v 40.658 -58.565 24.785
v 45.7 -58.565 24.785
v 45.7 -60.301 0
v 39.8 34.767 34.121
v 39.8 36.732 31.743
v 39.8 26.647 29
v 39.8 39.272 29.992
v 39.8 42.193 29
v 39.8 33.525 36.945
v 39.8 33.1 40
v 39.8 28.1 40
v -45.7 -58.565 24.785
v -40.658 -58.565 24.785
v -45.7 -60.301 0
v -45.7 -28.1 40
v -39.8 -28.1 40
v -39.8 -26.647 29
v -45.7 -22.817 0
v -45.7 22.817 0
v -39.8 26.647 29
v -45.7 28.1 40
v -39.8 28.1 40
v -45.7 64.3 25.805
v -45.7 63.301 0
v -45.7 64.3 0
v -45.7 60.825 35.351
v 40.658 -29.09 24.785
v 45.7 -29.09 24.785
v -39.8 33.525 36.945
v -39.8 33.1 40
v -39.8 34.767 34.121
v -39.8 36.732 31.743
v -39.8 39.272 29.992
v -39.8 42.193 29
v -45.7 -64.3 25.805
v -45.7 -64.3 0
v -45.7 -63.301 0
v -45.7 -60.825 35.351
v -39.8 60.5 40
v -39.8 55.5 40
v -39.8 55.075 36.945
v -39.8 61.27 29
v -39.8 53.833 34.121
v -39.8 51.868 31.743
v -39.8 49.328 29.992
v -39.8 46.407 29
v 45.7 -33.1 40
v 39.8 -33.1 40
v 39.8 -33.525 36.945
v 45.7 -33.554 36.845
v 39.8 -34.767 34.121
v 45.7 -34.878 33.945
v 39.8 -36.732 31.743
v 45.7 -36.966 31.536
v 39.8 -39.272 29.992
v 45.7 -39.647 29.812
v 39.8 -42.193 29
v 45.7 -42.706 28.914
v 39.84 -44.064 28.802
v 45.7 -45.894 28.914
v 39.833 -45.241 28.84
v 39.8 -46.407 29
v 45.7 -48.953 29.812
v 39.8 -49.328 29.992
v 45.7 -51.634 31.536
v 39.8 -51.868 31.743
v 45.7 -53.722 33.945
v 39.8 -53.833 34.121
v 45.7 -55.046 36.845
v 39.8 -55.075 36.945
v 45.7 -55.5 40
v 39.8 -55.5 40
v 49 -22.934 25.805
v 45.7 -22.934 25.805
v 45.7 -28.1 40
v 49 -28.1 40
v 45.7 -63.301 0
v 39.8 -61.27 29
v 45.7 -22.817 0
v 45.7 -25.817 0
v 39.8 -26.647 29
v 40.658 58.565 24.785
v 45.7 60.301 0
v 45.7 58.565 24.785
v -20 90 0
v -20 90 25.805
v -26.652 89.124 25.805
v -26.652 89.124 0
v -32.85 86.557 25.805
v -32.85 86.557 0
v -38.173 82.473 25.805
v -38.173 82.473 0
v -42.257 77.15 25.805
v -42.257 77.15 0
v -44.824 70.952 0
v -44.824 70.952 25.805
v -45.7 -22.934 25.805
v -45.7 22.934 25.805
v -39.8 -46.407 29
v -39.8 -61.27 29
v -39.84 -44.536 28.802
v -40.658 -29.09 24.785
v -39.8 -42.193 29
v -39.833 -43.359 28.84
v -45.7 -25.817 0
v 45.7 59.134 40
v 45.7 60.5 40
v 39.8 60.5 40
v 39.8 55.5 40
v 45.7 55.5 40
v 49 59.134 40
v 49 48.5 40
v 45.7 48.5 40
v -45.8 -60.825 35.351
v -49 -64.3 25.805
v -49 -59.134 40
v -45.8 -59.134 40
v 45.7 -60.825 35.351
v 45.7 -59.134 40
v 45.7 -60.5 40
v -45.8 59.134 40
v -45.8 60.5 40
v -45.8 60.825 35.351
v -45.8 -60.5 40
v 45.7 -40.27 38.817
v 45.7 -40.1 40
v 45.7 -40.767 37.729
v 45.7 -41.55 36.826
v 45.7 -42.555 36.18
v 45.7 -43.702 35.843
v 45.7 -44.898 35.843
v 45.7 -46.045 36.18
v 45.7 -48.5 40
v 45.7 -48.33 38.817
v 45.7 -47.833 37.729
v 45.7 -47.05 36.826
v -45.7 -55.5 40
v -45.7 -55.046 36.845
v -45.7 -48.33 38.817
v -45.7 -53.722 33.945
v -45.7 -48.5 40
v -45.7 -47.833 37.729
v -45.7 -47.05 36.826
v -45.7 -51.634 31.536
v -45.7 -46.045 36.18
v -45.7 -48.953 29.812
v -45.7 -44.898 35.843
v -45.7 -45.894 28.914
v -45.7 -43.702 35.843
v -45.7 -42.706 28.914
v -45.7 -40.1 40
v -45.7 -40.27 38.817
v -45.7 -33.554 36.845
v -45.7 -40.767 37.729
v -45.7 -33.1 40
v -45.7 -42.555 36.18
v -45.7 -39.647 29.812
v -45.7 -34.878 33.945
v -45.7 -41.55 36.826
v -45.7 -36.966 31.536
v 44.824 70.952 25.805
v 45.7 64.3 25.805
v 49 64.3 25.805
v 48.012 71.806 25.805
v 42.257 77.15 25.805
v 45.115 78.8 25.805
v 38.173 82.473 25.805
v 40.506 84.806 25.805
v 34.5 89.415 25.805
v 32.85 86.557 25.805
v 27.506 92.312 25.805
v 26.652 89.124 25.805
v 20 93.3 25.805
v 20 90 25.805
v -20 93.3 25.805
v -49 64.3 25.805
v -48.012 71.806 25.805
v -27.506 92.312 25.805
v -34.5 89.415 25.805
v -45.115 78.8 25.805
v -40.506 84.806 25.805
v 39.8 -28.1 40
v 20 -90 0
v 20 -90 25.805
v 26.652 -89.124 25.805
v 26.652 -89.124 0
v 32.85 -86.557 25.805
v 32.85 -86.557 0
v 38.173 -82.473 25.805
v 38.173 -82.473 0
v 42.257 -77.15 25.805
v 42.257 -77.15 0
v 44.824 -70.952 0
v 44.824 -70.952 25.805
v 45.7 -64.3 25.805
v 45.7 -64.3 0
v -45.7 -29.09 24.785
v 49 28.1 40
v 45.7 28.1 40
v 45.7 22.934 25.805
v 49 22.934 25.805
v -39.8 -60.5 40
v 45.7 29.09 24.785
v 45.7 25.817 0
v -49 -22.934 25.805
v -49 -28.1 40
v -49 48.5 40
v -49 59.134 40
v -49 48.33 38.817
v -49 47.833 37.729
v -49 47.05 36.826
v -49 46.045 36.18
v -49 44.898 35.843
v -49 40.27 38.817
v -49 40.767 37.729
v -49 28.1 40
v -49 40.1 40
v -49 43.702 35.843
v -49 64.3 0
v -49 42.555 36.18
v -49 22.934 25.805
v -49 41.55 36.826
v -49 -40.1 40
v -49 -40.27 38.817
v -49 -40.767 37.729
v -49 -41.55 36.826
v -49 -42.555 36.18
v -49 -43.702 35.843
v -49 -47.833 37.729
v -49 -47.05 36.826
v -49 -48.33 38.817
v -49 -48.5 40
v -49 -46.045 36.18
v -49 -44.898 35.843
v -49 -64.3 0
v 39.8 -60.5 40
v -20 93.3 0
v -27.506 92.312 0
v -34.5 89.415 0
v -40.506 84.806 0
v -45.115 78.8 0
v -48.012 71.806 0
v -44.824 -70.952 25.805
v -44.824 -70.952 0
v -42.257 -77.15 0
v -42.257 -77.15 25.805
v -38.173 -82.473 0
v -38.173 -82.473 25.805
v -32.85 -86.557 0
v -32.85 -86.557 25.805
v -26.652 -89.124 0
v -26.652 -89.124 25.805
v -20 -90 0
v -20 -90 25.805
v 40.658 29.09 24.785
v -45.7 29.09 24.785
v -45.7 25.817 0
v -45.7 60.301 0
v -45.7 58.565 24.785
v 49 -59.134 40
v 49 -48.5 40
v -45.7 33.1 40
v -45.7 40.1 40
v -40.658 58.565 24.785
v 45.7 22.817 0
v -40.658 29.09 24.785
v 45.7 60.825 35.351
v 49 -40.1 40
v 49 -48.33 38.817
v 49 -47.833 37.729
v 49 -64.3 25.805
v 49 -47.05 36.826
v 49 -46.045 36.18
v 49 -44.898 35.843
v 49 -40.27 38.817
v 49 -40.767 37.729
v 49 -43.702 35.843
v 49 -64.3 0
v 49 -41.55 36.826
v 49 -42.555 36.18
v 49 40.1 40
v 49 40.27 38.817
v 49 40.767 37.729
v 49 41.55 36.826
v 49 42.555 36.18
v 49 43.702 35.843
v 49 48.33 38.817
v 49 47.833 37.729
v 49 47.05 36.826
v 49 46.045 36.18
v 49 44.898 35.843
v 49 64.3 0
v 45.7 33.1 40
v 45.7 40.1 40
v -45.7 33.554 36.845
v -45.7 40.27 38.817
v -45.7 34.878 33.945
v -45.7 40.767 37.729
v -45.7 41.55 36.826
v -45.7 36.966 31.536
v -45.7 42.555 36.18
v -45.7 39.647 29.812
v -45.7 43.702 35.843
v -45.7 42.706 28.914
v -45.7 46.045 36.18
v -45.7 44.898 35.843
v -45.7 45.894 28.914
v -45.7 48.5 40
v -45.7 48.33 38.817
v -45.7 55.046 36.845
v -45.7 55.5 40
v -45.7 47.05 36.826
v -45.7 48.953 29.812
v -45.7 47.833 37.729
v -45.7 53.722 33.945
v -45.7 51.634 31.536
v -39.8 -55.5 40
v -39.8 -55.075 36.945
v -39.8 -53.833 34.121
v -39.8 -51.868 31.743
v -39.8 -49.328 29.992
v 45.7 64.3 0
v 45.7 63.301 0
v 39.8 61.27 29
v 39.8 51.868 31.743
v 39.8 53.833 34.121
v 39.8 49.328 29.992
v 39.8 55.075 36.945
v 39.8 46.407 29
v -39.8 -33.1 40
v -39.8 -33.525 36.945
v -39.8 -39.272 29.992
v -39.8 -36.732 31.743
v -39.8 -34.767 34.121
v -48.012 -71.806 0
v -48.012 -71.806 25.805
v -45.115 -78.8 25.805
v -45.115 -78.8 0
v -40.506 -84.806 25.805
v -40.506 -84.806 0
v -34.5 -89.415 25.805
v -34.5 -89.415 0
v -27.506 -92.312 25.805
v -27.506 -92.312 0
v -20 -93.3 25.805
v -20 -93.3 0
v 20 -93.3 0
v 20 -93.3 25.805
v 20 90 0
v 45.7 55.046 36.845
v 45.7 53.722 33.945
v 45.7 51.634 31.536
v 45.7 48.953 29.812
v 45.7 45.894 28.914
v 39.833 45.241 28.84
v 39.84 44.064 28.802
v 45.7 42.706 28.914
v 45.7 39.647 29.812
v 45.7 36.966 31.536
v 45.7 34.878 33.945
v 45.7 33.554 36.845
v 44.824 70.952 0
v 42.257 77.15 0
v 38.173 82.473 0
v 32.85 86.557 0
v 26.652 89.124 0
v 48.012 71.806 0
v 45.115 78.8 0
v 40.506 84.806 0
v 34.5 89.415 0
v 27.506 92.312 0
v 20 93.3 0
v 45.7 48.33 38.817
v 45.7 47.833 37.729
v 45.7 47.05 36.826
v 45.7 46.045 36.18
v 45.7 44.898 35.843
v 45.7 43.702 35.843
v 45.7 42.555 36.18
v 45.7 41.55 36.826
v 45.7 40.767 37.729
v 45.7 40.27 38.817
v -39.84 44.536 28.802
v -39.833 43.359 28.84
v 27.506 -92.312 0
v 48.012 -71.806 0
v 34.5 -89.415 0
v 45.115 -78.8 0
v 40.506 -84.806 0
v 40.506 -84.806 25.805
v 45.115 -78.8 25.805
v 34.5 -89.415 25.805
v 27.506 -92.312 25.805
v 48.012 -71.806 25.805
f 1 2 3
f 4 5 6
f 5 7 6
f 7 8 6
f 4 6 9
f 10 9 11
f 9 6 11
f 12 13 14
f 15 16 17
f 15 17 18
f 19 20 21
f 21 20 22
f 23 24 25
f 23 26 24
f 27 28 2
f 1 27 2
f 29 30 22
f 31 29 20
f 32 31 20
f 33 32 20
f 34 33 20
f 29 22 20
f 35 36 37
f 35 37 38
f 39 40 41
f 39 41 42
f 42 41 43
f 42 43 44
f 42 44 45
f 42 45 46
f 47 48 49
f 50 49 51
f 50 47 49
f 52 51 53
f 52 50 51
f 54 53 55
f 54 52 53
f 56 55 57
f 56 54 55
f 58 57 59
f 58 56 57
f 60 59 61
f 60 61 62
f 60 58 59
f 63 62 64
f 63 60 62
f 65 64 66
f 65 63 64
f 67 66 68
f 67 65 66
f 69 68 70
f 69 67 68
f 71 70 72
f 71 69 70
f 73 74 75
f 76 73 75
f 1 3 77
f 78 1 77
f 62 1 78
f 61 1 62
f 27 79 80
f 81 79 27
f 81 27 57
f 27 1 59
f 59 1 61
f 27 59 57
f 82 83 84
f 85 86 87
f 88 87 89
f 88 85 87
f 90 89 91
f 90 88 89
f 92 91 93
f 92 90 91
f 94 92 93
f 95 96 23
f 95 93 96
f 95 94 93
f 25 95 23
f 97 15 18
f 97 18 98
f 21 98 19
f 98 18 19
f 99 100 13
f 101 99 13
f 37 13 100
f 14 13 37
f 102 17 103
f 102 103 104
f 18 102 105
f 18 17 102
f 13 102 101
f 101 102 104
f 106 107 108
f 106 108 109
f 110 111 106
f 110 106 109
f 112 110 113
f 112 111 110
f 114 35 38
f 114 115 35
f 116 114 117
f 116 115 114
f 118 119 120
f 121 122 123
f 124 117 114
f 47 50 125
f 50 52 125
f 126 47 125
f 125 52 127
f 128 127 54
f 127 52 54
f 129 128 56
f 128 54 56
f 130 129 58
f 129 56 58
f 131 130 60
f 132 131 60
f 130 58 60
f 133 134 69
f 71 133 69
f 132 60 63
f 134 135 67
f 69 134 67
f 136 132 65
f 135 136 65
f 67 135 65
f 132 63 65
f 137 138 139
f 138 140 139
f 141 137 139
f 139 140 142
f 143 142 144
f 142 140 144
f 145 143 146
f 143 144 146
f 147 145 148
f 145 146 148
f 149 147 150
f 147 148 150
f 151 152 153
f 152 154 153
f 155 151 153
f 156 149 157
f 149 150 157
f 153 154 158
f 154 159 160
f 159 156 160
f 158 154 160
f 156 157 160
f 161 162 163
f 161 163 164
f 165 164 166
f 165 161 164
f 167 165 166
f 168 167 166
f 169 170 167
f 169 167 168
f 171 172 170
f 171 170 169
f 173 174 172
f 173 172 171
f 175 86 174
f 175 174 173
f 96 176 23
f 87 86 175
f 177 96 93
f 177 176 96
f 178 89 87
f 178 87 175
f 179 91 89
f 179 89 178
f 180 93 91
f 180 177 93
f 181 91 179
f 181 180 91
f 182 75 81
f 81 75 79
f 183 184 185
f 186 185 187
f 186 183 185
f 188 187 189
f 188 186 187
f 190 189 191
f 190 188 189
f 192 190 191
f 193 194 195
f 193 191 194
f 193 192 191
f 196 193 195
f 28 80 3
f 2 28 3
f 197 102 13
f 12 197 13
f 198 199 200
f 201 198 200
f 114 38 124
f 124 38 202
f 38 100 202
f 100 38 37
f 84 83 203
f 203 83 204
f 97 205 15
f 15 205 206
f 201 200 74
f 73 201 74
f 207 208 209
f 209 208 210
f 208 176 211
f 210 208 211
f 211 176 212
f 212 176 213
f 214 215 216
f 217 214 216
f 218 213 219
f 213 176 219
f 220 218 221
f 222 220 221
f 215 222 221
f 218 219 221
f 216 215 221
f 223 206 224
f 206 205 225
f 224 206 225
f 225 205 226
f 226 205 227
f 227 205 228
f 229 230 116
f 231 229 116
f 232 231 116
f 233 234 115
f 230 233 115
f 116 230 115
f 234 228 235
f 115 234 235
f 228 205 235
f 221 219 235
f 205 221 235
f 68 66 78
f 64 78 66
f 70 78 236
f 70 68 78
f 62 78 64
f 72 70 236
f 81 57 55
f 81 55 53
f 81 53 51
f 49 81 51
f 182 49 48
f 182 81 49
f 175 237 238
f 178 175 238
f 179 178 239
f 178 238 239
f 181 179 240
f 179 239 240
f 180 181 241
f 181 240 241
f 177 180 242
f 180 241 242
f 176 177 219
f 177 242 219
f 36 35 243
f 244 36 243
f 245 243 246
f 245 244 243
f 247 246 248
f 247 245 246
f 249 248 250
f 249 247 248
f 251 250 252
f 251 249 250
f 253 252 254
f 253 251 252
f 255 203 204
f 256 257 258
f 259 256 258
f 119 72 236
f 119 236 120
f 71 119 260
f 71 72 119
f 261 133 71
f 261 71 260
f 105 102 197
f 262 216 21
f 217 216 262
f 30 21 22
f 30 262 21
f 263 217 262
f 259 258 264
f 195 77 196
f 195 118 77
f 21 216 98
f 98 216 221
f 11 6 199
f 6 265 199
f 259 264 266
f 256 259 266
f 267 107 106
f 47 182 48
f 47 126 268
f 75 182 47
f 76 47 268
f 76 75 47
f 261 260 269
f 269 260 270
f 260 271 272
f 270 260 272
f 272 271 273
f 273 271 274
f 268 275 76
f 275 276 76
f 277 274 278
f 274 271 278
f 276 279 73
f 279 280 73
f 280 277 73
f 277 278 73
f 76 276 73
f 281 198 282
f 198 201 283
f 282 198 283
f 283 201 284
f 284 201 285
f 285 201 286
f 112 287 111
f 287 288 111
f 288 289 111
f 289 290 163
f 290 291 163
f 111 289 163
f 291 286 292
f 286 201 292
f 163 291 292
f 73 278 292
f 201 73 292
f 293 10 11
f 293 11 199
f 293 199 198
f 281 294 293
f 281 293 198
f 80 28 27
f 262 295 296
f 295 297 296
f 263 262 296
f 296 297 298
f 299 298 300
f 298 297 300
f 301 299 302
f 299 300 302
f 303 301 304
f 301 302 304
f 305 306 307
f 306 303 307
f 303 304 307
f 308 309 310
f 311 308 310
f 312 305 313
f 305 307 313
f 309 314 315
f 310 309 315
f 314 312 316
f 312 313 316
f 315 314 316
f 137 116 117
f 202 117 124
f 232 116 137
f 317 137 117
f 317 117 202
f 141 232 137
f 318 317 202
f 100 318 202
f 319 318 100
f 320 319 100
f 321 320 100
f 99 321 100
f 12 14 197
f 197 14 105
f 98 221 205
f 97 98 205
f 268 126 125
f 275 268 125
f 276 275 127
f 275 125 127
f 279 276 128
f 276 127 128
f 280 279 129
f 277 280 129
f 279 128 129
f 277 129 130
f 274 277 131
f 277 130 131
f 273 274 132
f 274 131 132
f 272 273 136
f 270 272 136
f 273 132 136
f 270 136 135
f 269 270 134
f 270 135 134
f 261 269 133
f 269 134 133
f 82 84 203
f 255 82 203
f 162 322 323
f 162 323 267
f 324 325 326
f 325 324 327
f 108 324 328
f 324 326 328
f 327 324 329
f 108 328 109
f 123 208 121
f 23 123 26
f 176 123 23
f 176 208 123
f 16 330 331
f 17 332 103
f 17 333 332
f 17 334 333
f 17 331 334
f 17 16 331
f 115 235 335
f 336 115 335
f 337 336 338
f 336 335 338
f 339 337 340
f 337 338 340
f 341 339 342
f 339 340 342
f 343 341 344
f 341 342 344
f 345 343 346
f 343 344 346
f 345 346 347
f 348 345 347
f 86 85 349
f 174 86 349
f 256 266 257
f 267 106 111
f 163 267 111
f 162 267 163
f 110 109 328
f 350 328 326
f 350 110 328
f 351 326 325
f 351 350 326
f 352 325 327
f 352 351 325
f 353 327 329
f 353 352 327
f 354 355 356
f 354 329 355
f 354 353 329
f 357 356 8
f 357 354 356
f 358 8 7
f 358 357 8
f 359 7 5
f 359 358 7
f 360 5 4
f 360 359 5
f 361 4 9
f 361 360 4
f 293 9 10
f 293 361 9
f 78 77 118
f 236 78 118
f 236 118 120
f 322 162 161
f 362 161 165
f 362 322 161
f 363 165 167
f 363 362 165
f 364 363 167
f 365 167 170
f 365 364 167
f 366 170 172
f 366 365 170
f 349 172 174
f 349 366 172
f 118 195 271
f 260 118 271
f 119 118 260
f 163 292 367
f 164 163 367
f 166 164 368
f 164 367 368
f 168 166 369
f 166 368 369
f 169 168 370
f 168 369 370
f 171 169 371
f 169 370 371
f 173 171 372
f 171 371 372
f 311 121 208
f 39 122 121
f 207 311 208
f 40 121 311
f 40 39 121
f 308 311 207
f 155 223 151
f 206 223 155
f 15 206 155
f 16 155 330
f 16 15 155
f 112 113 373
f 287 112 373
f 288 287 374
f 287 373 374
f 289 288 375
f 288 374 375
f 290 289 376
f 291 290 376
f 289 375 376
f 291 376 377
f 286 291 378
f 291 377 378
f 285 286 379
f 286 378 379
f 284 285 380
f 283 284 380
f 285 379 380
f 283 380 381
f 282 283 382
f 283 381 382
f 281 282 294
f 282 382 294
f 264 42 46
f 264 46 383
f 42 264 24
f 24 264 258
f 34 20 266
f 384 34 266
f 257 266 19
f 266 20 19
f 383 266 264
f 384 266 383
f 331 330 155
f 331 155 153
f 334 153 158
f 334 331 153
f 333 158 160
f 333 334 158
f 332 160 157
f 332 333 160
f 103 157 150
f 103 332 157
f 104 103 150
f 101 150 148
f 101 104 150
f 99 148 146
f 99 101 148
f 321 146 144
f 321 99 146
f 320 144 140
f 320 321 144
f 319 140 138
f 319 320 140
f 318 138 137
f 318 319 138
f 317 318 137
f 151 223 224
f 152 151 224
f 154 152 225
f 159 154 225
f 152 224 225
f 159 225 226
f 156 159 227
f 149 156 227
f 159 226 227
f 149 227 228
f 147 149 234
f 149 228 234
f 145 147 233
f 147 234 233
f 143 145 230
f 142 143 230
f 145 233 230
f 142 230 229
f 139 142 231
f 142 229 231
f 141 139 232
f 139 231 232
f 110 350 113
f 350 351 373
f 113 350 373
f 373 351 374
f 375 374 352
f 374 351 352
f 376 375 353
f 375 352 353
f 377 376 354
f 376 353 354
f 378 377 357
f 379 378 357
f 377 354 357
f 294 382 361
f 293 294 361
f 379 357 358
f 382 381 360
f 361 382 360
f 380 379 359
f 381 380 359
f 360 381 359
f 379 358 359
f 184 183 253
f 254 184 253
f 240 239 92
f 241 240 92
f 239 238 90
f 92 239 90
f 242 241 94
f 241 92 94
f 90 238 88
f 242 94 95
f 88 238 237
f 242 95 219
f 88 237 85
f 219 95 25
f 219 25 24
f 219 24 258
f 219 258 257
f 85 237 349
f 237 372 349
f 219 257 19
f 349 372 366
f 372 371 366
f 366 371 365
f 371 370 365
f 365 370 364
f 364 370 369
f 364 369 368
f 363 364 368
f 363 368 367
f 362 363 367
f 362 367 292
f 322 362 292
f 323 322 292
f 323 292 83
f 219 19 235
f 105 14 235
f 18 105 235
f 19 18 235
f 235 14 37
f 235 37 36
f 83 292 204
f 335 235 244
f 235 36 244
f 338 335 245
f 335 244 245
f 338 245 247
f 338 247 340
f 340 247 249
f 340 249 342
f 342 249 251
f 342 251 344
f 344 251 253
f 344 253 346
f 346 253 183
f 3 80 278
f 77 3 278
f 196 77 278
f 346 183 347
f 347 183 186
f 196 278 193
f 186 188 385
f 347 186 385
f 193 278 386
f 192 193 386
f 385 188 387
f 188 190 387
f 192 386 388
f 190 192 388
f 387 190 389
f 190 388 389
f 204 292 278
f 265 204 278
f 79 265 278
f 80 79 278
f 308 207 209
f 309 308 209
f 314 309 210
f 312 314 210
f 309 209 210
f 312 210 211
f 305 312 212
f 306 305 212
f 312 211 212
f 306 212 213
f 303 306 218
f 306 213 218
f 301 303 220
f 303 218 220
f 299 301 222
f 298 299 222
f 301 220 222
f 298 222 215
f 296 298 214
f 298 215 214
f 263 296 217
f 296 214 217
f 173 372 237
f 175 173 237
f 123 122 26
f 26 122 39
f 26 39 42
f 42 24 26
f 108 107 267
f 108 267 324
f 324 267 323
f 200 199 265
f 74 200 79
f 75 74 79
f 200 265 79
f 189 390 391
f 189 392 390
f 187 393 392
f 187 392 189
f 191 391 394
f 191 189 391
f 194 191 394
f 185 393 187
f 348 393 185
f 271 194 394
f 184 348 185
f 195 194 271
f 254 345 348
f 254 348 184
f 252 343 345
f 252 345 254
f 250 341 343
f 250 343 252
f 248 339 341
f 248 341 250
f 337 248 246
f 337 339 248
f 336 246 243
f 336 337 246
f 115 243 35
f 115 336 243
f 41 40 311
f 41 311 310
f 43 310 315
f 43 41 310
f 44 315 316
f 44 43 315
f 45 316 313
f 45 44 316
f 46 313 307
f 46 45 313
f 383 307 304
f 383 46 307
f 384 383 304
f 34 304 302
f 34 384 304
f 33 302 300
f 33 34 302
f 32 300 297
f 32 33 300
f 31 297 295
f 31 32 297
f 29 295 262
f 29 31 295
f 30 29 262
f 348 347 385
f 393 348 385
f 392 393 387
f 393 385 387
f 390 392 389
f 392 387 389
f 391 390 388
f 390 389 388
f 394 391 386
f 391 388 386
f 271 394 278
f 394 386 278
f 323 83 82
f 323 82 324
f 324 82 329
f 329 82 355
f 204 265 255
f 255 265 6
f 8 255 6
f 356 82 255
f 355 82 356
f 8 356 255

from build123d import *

# Parameters (mm, degrees)
PAD001_DEPTH         = 40
POCKET_DEPTH         = 101.001
PAD002_DEPTH         = 91.5
POCKET001_DEPTH      = 64
POCKET001_DEPTH_BACK = 64


with BuildPart() as part:
    # Sketch003 (on Sketch) → Pad001 (new body)
    with BuildSketch(Plane.XY):
        with BuildLine():
            Line((-20, -93.3), (20, -93.3))
            ThreePointArc((20, -93.3), (40.506097, -84.806097), (49, -64.3))
            Line((49, -64.3), (49, 64.3))
            ThreePointArc((49, 64.3), (40.506097, 84.806097), (20, 93.3))
            Line((20, 93.3), (-20, 93.3))
            ThreePointArc((-20, 93.3), (-40.506097, 84.806097), (-49, 64.3))
            Line((-49, 64.3), (-49, -64.3))
            ThreePointArc((-49, -64.3), (-40.506097, -84.806097), (-20, -93.3))
        make_face()
        with BuildLine():
            Line((-20, 90), (20, 90))
            ThreePointArc((45.7, 64.3), (38.172644, 82.472644), (20, 90))
            Line((45.7, 64.3), (45.7, -64.3))
            ThreePointArc((20, -90), (38.172644, -82.472644), (45.7, -64.3))
            Line((20, -90), (-20, -90))
            ThreePointArc((-45.7, -64.299999), (-38.172644, -82.472644), (-20, -90))
            Line((-45.7, -64.299999), (-45.7, 64.3))
            ThreePointArc((-20, 90), (-38.172644, 82.472644), (-45.7, 64.3))
        make_face(mode=Mode.SUBTRACT)
    extrude(amount=PAD001_DEPTH)

    # Sketch004 (on Face7 of Pad001) → Pocket (cut, through all)
    with BuildSketch(Plane(origin=(-52, 0, 0), x_dir=(0, -1, 0), z_dir=(-1, 0, 0))):
        with BuildLine():
            Line((-48.5, 40), (-59.133539, 40))
            Line((-59.133539, 40), (-64.3, 25.805264))
            Line((-64.3, 25.805264), (-99.376816, 25.805264))
            Line((-99.376816, 25.805264), (-99.376816, 55.805264))
            Line((-99.376816, 55.805264), (102.829521, 55.805264))
            Line((102.829521, 55.805264), (102.829521, 25.805264))
            Line((102.829521, 25.805264), (64.3, 25.805264))
            Line((64.3, 25.805264), (59.133539, 40))
            Line((59.133539, 40), (48.5, 40))
            ThreePointArc((40.1, 40), (44.3, 35.8), (48.5, 40))
            Line((28.1, 40), (40.1, 40))
            Line((22.933539, 25.805264), (28.1, 40))
            Line((-22.933539, 25.805264), (22.933539, 25.805264))
            Line((-28.1, 40), (-22.933539, 25.805264))
            Line((-40.1, 40), (-28.1, 40))
            ThreePointArc((-48.5, 40), (-44.3, 35.8), (-40.1, 40))
        make_face()
    extrude(amount=-POCKET_DEPTH, mode=Mode.SUBTRACT)

    # Sketch005 (on Face15 of Pocket) → Pad002 (join)
    with BuildSketch(Plane(origin=(45.7, 0, 0), x_dir=(0, -1, 0), z_dir=(-1, 0, 0))):
        with BuildLine():
            Line((-60.5, 40), (-63.300706, 0))
            Line((-63.300706, 0), (-60.300706, 0))
            Line((-60.300706, 0), (-58.565336, 24.784757))
            Line((-58.565336, 24.784757), (-29.090411, 24.784757))
            Line((-29.090411, 24.784757), (-25.816907, 0))
            Line((-25.816907, 0), (-22.816907, 0))
            Line((-22.816907, 0), (-28.1, 40))
            Line((-33.1, 40), (-28.1, 40))
            ThreePointArc((-55.5, 40), (-44.3, 28.8), (-33.1, 40))
            Line((-60.5, 40), (-55.5, 40))
        make_face()
        with BuildLine():
            Line((28.1, 40), (22.816907, 0))
            Line((25.816907, 0), (22.816907, 0))
            Line((29.090411, 24.784757), (25.816907, 0))
            Line((29.090411, 24.784757), (58.565336, 24.784757))
            Line((58.565336, 24.784757), (60.300706, 0))
            Line((60.300706, 0), (63.300706, 0))
            Line((63.300706, 0), (60.5, 40))
            Line((55.5, 40), (60.5, 40))
            ThreePointArc((33.1, 40), (44.3, 28.8), (55.5, 40))
            Line((28.1, 40), (33.1, 40))
        make_face()
    extrude(amount=PAD002_DEPTH)

    # Sketch006 → Pocket001 (cut, two sides)
    with BuildSketch(Plane.XZ) as pocket001_sk:
        Polygon((-39.8, 40), (-39.8, 29), (-45.7, 0), (45.7, 0), (39.8, 29), (39.8, 40), align=None)
    extrude(amount=-POCKET001_DEPTH, mode=Mode.SUBTRACT)
    extrude(pocket001_sk.sketch, amount=POCKET001_DEPTH_BACK, mode=Mode.SUBTRACT)


solid = part.part
